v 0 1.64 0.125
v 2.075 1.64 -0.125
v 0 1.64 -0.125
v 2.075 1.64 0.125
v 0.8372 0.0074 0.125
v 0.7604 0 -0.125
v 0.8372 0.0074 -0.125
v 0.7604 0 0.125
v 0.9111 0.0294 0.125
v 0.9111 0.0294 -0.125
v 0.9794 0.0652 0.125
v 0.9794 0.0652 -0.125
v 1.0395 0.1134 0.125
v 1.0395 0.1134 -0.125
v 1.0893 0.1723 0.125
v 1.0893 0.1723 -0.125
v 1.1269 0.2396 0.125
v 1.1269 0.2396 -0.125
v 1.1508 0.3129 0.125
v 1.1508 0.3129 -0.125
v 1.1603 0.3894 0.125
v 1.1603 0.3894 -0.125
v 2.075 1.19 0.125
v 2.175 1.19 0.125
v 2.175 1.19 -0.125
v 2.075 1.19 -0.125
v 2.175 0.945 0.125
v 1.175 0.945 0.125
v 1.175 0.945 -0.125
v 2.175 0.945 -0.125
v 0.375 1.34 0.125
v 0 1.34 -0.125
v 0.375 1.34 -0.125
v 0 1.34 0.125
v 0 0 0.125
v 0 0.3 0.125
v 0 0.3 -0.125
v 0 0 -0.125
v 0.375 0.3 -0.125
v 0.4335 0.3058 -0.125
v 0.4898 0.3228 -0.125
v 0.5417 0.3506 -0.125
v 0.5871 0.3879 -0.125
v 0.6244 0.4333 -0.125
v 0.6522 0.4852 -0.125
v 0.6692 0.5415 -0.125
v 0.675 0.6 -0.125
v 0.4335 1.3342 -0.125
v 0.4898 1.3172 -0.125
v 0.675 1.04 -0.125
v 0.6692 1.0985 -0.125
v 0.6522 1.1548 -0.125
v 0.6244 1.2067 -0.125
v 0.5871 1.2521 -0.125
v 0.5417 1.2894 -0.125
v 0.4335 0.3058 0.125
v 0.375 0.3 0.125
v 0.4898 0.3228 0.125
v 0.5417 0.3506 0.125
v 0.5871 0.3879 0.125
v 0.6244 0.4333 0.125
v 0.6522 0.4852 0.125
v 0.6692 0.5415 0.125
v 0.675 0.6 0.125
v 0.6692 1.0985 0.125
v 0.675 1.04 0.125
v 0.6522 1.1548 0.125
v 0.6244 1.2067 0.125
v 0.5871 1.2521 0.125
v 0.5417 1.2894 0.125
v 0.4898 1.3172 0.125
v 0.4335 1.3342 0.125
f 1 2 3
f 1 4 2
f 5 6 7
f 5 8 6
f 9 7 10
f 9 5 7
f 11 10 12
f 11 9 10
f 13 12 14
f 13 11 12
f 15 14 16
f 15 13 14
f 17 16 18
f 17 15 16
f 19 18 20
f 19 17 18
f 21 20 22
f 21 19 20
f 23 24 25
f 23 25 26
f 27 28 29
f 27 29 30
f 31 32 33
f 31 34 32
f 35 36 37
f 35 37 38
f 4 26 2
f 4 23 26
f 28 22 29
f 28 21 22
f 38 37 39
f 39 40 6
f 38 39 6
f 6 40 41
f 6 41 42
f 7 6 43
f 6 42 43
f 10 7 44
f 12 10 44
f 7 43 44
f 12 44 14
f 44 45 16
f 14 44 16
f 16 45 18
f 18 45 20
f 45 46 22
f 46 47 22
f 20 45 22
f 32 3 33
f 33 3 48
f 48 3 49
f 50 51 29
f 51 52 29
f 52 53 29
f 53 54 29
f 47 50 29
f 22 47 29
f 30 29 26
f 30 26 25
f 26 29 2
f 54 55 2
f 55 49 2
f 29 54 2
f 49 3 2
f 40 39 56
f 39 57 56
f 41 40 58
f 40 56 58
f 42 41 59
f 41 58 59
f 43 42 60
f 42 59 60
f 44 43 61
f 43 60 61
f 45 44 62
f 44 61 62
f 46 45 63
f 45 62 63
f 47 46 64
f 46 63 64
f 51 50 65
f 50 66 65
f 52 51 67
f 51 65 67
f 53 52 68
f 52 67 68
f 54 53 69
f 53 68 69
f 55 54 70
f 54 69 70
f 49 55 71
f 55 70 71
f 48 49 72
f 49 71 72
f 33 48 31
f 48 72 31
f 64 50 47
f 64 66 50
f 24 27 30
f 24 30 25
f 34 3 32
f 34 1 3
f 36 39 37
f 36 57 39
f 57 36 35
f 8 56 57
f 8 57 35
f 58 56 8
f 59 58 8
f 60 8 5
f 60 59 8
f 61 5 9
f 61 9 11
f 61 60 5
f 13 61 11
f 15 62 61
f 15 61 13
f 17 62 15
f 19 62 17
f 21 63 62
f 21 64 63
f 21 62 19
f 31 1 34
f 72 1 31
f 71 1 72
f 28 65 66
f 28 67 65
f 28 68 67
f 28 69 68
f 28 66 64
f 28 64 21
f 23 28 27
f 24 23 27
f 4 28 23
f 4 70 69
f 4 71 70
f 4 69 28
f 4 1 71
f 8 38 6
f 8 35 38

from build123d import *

# Parameters (mm, degrees)
BOSS_EXTRUDE1_DEPTH = 0.125
FILLET1_R           = 0.3
FILLET2_R           = 0.4


with BuildPart() as part:
    # frame_outline → Boss-Extrude1 (new, symmetric)
    with BuildSketch(Plane.XY):
        Polygon((0, 1.64), (0, 1.34), (0.675, 1.34), (0.675, 0.3), (0, 0.3), (0, 0), (1.15, 0), (1.175, 0.945), (2.175, 0.945), (2.175, 1.19), (2.075, 1.19), (2.075, 1.64), (0.7, 1.64), align=None)
    extrude(amount=BOSS_EXTRUDE1_DEPTH, both=True)

    # Fillet1
    fillet1_edges = [part.edges().sort_by_distance(p)[0] for p in [
        (0.675, 0.3, 0),
        (0.675, 1.34, 0),
    ]]
    fillet(fillet1_edges, radius=FILLET1_R)

    # Fillet2
    fillet2_edges = [part.edges().sort_by_distance(p)[0] for p in [
        (1.15, 0, 0),
    ]]
    fillet(fillet2_edges, radius=FILLET2_R)


solid = part.part
